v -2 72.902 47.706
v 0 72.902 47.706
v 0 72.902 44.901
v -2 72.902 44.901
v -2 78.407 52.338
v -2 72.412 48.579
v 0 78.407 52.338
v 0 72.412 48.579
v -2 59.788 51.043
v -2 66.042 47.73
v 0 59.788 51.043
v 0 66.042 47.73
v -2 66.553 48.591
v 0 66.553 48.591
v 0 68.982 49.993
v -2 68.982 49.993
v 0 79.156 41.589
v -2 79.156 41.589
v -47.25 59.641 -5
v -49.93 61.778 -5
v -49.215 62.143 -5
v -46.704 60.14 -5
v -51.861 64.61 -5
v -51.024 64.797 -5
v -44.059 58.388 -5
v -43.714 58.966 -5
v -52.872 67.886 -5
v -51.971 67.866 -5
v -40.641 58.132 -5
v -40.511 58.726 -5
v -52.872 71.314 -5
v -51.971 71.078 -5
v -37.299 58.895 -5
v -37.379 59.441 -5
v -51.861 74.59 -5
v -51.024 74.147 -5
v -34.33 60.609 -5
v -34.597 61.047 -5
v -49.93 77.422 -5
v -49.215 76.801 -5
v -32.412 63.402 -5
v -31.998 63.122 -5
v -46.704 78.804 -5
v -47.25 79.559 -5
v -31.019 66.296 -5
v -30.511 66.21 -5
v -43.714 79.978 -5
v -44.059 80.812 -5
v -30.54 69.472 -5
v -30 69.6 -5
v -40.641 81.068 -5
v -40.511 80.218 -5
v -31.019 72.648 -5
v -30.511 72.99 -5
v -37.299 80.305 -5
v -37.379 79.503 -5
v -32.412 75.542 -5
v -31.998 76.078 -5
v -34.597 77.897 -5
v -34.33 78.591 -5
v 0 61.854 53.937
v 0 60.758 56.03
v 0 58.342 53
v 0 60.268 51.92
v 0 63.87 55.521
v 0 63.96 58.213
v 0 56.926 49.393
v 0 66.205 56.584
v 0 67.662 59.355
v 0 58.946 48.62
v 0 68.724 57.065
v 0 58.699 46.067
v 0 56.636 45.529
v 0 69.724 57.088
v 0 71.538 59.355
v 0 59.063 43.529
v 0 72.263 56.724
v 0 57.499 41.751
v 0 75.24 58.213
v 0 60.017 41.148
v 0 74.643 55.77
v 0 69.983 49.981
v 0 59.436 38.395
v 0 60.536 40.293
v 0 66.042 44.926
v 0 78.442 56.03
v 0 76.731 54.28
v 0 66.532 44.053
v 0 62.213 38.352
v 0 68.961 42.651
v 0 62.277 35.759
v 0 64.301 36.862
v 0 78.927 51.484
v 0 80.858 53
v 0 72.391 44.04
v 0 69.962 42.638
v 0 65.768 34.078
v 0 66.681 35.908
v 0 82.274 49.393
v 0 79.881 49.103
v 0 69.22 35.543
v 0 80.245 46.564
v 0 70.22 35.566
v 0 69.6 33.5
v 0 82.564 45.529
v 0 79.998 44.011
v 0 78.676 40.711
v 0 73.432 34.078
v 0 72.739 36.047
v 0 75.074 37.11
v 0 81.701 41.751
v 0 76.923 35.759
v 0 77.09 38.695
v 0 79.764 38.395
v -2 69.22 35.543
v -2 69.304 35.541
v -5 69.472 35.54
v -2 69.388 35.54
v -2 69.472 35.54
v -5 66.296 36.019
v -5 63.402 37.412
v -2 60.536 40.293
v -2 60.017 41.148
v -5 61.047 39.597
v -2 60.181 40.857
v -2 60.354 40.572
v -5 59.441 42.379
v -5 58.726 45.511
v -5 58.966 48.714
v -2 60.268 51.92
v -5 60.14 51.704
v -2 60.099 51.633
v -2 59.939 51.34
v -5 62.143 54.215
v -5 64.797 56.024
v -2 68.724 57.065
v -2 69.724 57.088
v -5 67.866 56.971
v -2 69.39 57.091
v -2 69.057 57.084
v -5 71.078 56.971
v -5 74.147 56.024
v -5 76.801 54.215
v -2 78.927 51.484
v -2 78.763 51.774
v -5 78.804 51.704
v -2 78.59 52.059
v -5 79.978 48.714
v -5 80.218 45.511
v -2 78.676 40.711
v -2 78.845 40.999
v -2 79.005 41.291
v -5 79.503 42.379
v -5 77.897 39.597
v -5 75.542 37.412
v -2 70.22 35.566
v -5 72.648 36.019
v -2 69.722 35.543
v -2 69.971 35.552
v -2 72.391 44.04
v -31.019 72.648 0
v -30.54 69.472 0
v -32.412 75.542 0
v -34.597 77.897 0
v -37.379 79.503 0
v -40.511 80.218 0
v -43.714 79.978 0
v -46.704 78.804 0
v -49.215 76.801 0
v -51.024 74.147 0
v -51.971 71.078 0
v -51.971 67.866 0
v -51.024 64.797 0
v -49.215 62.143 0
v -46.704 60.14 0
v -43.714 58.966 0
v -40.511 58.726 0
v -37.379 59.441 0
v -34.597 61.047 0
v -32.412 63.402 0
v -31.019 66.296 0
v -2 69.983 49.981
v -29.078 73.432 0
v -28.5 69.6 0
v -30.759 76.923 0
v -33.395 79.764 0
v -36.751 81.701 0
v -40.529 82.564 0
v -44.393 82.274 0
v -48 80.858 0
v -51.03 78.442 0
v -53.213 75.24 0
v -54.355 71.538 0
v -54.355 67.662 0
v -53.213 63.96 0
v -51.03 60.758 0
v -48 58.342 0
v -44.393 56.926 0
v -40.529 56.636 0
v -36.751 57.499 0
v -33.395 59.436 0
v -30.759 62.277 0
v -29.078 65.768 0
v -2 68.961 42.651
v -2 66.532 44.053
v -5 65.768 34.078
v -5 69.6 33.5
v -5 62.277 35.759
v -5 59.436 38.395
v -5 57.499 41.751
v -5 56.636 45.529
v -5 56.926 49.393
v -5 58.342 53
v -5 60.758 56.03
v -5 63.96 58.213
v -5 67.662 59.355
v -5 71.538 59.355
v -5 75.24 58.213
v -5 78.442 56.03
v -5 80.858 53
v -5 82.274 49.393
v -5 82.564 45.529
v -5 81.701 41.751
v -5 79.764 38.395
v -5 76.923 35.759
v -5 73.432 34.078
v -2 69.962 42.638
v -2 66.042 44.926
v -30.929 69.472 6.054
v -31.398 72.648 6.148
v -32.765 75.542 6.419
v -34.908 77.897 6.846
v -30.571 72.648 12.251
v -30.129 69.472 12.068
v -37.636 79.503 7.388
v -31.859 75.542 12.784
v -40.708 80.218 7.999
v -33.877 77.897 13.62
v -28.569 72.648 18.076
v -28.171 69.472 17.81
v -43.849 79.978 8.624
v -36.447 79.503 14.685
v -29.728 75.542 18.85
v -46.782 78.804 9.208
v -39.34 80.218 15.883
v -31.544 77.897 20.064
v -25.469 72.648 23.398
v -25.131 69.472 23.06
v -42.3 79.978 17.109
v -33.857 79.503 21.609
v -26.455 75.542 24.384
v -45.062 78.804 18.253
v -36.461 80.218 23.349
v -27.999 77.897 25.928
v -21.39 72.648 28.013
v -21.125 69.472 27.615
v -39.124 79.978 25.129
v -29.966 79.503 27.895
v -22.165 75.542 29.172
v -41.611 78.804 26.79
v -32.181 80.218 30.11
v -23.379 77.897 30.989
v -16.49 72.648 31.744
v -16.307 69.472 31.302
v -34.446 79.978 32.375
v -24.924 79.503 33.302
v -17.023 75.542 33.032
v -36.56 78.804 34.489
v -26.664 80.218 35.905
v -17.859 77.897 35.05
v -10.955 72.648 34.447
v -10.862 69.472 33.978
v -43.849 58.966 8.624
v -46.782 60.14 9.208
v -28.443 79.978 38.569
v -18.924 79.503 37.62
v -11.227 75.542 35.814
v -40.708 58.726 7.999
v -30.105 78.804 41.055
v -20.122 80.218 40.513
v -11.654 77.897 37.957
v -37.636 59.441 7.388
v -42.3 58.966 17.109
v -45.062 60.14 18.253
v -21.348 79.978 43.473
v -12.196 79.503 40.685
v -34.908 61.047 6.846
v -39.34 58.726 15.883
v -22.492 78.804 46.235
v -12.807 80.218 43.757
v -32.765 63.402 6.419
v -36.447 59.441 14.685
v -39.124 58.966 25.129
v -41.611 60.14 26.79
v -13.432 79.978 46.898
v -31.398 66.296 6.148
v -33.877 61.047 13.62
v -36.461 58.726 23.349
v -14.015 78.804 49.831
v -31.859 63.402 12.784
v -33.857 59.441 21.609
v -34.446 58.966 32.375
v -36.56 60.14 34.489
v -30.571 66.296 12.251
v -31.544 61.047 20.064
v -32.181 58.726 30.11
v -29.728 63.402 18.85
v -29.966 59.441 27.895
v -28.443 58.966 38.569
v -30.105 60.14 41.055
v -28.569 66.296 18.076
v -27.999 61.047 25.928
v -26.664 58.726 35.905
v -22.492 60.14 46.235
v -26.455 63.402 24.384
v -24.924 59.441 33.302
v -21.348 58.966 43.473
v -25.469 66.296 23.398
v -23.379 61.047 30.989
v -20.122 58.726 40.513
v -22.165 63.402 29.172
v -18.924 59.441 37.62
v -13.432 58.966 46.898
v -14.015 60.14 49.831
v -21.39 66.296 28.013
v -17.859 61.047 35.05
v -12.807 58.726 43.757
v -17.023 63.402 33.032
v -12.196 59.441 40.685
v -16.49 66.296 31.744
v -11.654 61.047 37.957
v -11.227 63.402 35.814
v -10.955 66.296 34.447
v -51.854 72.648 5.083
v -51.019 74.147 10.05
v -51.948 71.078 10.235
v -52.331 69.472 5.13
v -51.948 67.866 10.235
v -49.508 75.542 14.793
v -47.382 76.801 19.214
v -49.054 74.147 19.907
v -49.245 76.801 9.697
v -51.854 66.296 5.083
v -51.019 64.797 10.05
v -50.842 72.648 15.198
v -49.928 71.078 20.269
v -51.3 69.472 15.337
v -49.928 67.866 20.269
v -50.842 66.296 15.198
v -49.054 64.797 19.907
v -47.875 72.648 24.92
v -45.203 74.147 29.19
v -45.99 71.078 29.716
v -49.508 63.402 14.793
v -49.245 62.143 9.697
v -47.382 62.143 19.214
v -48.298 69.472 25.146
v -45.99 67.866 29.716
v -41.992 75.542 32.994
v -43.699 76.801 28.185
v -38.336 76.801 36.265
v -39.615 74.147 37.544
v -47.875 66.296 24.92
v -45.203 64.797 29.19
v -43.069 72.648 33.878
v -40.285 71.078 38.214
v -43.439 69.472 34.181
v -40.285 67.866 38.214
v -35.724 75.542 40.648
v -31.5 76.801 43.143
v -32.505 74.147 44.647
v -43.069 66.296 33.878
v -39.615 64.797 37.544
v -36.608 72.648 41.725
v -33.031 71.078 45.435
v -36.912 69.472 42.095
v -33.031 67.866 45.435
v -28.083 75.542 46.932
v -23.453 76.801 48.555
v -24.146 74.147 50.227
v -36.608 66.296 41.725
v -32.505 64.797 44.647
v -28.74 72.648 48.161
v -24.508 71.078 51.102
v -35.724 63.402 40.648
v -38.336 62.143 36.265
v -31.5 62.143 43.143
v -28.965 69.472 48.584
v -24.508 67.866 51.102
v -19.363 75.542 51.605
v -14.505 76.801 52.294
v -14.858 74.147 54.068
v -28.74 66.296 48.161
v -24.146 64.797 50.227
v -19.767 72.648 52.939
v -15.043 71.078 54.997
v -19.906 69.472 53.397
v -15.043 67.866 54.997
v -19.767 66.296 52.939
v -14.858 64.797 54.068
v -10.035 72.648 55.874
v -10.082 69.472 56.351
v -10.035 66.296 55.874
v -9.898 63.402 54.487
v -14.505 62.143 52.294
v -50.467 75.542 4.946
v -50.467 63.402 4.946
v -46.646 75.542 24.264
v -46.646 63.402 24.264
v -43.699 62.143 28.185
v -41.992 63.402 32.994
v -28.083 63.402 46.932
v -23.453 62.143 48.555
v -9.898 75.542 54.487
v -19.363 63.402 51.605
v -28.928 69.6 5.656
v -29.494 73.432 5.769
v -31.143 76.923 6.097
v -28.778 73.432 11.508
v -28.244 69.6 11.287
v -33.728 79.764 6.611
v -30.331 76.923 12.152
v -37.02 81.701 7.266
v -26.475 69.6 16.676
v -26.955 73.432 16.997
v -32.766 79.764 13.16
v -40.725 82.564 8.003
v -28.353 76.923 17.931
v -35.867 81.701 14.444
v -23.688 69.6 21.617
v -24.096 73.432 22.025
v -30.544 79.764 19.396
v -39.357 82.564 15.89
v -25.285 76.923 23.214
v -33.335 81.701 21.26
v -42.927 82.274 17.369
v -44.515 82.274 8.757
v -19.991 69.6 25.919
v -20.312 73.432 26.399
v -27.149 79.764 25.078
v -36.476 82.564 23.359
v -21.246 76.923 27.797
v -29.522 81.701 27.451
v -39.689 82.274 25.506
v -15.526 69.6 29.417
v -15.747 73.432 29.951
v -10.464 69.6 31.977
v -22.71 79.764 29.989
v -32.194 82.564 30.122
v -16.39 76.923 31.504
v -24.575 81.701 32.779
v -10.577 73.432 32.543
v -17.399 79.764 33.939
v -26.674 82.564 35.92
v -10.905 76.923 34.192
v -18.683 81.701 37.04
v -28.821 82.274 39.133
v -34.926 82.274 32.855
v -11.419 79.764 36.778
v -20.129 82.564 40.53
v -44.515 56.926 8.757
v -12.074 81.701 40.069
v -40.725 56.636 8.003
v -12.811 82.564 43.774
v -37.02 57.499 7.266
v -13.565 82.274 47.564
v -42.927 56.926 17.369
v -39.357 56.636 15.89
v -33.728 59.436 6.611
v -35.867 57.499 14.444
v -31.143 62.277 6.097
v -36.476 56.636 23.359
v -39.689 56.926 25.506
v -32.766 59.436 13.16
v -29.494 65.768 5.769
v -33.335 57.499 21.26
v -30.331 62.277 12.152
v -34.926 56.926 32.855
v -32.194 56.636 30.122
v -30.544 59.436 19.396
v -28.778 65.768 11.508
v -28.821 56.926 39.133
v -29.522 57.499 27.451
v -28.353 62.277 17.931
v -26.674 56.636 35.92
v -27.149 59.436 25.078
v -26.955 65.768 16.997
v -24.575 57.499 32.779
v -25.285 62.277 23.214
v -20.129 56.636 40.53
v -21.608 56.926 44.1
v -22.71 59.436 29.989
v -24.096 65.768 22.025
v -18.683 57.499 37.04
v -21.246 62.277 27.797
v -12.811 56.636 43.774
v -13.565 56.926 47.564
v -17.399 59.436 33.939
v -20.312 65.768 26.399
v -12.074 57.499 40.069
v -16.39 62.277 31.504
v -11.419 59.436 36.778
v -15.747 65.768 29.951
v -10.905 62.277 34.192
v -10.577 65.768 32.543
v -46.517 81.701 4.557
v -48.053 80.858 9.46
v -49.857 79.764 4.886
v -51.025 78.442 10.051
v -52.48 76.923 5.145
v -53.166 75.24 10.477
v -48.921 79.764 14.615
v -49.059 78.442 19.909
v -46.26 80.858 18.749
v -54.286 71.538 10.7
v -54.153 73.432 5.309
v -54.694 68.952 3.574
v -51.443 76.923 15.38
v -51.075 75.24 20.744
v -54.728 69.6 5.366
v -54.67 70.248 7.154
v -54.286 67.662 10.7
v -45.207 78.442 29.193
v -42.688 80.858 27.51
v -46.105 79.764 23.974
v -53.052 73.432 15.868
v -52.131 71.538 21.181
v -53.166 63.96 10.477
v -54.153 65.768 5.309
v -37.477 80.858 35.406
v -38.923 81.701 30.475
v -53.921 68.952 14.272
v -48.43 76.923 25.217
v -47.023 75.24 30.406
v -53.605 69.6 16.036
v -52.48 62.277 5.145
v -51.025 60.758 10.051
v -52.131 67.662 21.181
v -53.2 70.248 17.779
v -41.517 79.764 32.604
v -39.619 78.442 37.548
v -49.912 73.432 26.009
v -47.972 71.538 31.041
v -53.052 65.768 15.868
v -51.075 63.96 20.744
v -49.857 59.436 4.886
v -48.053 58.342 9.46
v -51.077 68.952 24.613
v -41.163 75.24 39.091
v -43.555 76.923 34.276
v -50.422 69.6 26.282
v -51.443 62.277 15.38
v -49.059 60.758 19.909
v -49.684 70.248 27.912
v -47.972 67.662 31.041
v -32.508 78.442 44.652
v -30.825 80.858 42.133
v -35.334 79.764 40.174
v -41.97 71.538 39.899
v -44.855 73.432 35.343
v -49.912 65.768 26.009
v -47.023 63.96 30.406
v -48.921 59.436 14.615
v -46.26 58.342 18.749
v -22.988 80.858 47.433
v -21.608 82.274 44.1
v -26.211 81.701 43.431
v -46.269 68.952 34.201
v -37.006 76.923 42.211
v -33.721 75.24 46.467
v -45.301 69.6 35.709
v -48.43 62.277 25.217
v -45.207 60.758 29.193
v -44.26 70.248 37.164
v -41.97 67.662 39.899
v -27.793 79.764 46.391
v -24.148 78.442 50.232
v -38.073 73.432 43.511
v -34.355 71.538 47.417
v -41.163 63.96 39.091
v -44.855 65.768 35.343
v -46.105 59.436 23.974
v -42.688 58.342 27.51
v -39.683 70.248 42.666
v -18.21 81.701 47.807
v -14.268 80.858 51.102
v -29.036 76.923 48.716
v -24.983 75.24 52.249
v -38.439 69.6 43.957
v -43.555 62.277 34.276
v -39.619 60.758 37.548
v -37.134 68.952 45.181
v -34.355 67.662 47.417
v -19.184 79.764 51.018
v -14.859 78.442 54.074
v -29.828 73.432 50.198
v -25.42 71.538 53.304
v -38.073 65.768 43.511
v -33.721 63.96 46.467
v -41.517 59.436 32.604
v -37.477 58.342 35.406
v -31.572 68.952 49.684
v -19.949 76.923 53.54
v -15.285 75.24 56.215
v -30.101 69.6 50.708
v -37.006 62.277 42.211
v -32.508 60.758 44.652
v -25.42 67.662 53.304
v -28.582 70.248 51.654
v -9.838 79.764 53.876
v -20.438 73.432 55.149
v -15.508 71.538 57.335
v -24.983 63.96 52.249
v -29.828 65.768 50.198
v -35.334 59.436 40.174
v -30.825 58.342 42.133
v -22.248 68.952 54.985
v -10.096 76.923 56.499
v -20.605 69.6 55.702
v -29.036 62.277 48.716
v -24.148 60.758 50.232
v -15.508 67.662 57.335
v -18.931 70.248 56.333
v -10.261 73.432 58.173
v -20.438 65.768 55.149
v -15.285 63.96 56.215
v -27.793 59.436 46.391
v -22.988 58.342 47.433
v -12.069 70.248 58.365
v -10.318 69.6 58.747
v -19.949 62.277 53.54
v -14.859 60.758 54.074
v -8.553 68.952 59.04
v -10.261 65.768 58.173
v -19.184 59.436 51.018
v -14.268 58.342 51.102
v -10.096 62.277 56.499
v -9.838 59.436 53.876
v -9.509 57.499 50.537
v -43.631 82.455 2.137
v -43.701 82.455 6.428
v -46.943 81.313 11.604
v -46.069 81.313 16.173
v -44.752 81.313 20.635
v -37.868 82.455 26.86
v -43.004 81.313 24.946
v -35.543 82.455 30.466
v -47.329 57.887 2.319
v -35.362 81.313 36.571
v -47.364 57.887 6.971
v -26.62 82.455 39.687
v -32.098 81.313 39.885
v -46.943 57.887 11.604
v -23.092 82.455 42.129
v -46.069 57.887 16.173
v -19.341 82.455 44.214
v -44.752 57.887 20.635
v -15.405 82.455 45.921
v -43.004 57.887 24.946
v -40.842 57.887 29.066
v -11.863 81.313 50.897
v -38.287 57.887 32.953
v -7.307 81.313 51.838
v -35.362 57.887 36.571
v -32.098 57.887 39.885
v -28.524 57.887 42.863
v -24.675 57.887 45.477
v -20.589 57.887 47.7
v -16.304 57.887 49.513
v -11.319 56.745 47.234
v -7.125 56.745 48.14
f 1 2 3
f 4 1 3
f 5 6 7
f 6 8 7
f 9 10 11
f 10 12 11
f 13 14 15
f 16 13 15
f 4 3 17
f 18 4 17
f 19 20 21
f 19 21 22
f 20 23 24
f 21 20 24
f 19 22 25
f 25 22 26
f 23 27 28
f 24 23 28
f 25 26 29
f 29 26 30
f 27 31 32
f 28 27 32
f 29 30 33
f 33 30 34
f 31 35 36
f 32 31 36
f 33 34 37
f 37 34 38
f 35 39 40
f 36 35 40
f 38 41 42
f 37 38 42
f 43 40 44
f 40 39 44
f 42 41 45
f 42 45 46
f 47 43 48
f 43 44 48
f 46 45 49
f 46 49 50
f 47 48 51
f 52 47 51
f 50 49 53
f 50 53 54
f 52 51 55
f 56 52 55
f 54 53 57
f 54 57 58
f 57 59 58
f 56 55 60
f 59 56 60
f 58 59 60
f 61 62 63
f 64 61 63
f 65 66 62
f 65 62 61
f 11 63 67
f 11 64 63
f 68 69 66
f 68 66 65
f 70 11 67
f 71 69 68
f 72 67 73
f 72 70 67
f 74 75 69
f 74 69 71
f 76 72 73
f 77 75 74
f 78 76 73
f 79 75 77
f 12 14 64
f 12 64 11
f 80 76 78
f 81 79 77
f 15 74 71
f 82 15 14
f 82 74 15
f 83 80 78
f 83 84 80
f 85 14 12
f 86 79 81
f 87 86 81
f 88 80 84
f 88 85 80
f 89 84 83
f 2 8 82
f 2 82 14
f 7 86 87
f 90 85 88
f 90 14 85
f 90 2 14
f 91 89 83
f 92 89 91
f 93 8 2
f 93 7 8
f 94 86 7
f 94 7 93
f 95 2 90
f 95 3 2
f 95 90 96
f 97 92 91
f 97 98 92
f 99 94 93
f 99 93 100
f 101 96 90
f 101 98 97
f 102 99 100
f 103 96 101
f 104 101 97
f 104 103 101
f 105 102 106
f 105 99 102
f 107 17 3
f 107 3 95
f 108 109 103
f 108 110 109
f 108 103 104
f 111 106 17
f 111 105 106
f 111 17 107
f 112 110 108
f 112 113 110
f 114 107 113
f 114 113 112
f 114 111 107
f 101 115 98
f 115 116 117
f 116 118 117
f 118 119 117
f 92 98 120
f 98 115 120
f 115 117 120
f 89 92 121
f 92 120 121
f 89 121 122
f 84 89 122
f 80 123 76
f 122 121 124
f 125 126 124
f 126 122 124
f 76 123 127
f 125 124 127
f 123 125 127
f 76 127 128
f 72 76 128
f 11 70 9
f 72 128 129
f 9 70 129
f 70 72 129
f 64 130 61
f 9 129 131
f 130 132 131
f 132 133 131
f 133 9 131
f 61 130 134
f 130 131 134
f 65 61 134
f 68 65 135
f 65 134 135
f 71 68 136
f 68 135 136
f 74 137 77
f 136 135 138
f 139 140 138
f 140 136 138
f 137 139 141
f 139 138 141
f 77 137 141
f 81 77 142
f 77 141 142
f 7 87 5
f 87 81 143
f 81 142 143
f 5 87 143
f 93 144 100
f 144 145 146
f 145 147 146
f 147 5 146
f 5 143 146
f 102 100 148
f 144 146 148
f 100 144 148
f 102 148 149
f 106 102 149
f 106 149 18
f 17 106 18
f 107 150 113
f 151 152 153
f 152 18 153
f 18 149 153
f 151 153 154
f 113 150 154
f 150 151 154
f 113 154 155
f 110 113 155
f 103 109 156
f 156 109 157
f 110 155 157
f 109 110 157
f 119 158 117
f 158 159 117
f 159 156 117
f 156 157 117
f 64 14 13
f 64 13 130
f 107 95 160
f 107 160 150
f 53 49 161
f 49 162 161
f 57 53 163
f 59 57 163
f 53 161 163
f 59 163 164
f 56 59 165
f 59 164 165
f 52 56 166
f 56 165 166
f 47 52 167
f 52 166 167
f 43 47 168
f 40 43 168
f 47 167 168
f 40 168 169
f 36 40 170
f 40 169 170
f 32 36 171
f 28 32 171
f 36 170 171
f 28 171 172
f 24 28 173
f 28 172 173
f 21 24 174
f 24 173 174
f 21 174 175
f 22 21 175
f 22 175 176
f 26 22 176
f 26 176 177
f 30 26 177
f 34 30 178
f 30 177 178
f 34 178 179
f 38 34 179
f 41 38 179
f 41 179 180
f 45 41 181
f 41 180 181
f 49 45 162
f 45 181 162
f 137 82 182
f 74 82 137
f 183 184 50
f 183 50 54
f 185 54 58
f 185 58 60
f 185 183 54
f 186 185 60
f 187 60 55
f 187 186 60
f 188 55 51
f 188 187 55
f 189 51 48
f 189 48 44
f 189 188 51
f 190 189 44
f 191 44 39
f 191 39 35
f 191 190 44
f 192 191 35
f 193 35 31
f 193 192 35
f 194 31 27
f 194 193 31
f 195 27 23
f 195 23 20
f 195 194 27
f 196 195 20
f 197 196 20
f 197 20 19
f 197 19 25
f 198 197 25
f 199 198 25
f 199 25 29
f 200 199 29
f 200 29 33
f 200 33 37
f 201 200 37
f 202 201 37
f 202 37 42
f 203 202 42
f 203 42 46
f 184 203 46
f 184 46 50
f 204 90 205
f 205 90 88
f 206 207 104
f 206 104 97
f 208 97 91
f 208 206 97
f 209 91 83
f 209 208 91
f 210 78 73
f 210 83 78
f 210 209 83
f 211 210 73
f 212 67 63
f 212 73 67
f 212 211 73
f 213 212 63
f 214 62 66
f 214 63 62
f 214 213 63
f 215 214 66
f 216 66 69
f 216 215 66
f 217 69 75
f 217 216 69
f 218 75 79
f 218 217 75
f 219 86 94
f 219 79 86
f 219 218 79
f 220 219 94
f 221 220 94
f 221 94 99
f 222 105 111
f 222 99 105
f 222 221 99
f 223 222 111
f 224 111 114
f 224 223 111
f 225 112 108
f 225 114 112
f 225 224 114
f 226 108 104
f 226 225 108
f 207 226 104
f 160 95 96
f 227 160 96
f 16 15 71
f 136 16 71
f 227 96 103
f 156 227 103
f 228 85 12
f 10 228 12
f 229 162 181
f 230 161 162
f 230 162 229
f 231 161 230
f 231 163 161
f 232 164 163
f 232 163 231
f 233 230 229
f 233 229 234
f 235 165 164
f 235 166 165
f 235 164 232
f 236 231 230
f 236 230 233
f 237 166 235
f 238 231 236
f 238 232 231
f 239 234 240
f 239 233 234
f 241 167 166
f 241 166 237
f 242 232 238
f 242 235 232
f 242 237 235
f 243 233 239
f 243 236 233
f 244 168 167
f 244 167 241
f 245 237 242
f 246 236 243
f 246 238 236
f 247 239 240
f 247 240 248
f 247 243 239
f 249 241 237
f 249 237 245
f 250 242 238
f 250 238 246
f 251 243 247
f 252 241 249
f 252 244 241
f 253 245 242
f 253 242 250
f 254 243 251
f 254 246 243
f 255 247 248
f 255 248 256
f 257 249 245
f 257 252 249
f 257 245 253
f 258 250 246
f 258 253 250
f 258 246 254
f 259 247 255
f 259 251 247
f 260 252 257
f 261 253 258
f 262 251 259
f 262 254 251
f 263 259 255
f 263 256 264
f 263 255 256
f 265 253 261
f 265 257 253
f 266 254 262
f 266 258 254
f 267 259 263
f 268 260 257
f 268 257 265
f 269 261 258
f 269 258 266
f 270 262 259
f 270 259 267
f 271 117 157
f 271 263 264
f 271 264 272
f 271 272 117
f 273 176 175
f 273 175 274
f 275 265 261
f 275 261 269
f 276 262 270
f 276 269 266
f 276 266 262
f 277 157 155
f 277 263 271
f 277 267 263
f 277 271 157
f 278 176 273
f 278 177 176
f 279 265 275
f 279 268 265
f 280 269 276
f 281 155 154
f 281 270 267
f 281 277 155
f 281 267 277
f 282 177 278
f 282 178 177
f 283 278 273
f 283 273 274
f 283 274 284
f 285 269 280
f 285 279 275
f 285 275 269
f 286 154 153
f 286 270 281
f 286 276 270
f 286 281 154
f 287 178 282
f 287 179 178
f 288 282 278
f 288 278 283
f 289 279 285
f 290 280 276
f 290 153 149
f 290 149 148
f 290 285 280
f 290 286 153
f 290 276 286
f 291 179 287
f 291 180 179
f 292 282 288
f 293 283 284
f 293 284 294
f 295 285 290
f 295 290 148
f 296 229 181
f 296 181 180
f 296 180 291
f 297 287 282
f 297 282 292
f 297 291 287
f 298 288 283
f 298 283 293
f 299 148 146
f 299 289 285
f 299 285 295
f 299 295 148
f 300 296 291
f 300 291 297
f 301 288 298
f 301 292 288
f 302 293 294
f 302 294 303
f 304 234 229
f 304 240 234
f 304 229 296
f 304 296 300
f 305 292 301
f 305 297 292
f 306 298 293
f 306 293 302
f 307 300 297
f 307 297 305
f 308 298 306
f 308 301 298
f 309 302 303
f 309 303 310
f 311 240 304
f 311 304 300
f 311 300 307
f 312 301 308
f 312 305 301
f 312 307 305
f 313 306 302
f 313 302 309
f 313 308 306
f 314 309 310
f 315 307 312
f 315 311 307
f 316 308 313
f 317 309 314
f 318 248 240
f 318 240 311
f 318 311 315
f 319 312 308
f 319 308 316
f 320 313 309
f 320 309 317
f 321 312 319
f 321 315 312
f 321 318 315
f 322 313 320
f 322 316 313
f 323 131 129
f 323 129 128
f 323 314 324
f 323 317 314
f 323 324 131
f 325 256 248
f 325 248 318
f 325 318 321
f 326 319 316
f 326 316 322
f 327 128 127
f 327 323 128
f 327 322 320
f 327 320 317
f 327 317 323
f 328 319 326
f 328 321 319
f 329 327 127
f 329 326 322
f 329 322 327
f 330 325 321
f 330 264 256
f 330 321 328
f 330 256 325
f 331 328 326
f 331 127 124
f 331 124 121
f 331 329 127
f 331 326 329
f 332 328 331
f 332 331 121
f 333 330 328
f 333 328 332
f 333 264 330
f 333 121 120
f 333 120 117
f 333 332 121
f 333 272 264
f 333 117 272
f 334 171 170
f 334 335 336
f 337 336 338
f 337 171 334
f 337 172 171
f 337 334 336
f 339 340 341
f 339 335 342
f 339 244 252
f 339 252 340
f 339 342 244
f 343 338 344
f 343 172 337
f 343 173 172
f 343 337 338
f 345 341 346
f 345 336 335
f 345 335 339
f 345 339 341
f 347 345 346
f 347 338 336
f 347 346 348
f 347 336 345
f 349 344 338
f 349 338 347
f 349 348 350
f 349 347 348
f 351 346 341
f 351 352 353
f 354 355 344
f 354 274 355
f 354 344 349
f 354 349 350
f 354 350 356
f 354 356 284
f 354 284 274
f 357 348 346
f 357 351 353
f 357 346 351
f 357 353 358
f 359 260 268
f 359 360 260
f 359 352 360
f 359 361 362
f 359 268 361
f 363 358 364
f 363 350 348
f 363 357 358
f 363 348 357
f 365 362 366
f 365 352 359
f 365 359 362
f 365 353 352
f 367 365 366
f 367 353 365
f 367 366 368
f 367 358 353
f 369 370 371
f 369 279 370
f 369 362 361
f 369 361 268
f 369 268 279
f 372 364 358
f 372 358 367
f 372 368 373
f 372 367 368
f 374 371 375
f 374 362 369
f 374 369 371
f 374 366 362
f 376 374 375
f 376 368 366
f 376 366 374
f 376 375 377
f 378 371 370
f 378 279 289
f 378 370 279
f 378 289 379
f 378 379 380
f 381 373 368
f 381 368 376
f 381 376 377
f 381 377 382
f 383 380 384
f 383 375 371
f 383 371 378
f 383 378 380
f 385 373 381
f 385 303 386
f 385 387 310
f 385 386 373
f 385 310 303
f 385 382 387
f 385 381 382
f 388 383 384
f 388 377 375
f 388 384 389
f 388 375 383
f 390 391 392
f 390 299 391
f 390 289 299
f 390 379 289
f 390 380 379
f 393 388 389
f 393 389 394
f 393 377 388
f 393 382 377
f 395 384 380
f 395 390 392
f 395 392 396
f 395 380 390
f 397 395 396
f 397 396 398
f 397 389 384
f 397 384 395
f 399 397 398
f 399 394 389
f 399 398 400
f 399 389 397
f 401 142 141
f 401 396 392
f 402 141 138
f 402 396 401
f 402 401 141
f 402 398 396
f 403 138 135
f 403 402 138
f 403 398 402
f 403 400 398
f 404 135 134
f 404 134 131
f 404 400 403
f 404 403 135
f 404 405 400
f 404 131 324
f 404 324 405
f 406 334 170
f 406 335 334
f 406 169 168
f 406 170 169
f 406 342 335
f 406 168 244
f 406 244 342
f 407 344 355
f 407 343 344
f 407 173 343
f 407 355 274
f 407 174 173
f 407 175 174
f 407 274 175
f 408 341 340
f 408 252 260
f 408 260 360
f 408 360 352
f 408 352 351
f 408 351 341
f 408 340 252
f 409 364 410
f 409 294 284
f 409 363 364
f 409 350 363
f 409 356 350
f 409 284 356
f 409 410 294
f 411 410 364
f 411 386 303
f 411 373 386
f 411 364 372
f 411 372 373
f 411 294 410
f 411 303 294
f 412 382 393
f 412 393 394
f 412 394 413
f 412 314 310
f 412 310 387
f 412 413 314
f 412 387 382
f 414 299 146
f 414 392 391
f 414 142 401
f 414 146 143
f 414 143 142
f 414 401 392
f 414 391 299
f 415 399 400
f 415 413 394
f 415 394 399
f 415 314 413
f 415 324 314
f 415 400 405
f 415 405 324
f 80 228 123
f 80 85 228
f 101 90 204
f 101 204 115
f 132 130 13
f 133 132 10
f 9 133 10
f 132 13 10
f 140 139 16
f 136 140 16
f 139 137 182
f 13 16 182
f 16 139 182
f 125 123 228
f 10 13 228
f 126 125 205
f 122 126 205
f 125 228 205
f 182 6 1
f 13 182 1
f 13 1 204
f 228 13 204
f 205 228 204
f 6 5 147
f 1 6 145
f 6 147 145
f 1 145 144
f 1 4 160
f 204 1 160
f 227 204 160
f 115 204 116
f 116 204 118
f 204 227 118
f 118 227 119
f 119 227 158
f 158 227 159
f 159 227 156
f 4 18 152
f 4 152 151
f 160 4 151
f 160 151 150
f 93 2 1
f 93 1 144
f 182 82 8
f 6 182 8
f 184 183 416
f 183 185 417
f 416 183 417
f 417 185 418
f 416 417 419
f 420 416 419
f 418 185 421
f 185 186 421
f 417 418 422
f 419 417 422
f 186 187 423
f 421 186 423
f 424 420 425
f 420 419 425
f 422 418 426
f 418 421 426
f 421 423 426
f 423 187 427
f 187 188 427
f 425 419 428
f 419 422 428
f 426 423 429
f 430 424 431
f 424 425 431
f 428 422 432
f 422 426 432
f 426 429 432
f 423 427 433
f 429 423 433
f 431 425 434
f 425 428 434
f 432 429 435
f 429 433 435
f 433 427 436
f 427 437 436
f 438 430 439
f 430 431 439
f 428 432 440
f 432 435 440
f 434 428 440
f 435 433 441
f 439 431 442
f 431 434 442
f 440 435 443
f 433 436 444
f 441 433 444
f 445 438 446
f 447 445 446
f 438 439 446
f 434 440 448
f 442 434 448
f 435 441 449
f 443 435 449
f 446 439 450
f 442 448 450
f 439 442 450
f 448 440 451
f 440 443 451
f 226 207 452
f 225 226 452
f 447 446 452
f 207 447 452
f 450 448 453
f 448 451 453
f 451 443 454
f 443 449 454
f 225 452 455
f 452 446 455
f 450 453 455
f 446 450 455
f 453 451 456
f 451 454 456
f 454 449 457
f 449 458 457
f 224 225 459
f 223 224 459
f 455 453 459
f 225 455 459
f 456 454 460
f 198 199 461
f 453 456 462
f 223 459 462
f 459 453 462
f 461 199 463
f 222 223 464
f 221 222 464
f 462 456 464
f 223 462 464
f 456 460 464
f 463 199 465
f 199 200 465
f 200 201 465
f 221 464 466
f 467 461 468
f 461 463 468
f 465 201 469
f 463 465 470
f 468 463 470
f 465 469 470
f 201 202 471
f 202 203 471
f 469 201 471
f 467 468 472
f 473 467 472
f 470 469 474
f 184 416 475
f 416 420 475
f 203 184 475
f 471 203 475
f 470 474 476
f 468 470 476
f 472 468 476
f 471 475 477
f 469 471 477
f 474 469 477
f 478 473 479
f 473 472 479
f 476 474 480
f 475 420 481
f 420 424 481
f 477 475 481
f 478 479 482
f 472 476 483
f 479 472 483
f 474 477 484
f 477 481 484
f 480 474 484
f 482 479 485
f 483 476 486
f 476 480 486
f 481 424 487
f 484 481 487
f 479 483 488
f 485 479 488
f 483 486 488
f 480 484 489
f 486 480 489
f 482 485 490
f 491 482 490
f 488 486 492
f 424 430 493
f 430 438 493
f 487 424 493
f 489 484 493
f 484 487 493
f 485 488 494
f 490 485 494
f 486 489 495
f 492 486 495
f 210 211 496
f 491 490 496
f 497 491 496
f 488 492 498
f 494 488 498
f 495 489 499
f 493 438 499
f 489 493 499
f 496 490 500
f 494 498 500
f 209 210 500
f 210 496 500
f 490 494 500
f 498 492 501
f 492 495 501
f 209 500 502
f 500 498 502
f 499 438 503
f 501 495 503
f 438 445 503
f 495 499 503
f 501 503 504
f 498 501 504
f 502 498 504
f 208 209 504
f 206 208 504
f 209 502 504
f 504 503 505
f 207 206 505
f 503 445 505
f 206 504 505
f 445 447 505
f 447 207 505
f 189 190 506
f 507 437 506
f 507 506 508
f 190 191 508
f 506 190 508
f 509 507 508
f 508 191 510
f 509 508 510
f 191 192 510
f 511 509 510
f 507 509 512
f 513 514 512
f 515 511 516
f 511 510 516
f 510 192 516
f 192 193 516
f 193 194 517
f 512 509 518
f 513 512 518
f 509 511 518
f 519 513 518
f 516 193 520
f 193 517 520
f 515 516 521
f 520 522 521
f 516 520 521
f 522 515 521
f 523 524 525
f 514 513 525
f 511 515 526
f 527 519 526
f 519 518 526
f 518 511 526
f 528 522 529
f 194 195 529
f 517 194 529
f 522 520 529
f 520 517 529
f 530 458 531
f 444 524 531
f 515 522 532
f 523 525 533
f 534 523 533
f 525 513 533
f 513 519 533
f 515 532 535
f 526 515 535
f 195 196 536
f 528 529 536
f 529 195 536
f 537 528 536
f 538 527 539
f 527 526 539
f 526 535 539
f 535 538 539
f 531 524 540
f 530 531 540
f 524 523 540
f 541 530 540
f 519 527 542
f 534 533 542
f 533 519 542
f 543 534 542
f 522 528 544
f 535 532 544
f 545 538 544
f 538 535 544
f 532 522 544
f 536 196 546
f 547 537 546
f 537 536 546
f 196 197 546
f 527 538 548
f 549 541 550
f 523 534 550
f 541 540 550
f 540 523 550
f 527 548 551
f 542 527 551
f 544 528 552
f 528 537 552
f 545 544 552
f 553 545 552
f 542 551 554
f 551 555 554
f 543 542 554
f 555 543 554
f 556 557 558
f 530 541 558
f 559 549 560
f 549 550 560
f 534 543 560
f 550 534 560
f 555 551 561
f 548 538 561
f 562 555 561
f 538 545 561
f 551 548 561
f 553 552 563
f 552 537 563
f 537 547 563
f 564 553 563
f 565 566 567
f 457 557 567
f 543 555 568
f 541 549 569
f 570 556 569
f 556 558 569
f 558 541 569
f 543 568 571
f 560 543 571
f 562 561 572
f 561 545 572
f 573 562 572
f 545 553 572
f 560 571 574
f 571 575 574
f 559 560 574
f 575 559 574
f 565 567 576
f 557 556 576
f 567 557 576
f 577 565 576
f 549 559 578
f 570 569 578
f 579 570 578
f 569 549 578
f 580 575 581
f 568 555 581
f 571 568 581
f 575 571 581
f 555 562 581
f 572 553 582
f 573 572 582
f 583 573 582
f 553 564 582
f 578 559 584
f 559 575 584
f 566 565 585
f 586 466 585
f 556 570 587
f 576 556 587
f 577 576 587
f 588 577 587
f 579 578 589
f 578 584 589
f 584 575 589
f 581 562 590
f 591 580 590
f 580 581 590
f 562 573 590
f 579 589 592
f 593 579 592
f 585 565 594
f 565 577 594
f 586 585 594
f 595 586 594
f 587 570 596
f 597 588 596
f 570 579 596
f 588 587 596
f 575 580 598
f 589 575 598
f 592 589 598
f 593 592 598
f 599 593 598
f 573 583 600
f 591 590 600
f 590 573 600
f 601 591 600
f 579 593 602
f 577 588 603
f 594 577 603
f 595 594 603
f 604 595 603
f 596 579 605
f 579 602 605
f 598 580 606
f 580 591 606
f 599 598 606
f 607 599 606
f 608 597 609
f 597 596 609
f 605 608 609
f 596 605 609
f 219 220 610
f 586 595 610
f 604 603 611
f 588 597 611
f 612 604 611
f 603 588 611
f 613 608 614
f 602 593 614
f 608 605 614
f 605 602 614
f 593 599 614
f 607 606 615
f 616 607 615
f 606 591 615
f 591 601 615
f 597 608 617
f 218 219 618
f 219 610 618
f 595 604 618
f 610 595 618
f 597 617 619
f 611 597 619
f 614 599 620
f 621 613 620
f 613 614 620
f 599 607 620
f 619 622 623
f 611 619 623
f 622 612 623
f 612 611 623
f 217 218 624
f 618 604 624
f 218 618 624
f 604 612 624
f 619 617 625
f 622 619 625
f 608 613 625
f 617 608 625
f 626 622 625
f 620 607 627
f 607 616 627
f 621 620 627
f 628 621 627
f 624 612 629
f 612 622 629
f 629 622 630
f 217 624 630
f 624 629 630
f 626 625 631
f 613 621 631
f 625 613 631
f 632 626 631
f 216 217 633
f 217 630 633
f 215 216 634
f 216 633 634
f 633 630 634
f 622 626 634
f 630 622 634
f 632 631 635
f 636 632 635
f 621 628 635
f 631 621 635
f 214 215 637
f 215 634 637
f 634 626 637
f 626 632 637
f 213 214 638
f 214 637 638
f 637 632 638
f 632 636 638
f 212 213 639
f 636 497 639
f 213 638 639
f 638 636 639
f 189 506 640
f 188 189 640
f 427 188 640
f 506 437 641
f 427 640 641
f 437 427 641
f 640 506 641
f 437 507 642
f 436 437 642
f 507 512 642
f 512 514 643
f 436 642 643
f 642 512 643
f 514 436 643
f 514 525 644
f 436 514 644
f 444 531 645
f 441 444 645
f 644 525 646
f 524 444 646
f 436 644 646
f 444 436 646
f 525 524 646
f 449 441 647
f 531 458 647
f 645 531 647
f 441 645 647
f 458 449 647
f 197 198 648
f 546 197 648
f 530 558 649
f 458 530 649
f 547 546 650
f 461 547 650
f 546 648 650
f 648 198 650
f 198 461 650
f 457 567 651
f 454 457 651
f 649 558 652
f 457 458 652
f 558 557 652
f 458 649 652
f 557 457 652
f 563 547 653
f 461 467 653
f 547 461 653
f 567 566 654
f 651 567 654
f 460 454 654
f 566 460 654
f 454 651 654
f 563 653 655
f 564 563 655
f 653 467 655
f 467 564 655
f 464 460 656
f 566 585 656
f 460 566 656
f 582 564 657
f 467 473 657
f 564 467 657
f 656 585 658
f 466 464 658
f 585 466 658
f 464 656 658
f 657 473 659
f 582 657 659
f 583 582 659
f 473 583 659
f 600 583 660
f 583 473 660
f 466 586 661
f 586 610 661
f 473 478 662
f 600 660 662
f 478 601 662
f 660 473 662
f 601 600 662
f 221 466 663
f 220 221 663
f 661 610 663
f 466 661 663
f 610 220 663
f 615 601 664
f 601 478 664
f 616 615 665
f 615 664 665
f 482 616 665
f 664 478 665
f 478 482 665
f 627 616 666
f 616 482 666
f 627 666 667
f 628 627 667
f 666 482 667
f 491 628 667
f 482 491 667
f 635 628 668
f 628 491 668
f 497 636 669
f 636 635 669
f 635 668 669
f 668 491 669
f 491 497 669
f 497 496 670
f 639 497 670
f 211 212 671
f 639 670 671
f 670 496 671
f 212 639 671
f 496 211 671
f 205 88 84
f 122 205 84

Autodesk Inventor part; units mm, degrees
ref_plane "YZ Plane" through (0, 0, 0) normal (1, 0, 0) x (0, 1, 0)
ref_plane "XZ Plane" through (0, 0, 0) normal (0, 1, 0) x (-1, 0, 0)
ref_plane "XY Plane" through (0, 0, 0) normal (0, 0, 1) x (1, 0, 0)
sketch "Esquisse1" plane through (0, 0, 0) normal (0, 0, 1) x (1, 0, 0)
  circle A0 centre (-41.5, 69.6) radius 12.5 projected
  circle A1 centre (-41.5, 69.6) radius 11
  circle A2 centre (-41.5, 69.6) radius 13
  point P0 (0, 0)
  dimension "d11" = 0.5
  dimension "d15" = 2
ref_plane "Plan de construction2" through (-41.5, 69.6, 0) normal (0, -1, 0) x (0, 0, 1)
ref_plane "Plan de construction1" through (0, 0, -152.2) normal (0, -1, 0) x (0, 0, 1)
sketch "Esquisse2" plane through (-41.5, 69.6, 0) normal (0, -1, 0) x (0, 0, 1)
  point P0 (0, -41.5)
  point P1 (0, 0)
  point P2 (-5, 0)
  dimension "d1" = 5
ref_plane "Plan de construction4" through (-41.5, 69.6, -5) normal (0, 0, 1) x (1, 0, 0)
ref_plane "Plan de construction3" through (0, 0, 0) normal (0, 0, 1) x (1, 0, 0)
sketch "Esquisse3" plane through (-41.5, 69.6, -5) normal (0, 0, 1) x (1, 0, 0)
  circle A0 centre (0, 0) radius 12.5 projected
  circle A1 centre (0, 0) radius 9.5
  circle A2 centre (0, 0) radius 11.5
  point P0 (41.5, -69.6)
  dimension "d13" = 2
  dimension "d14" = 1
ref_plane "Plan de construction5" through (-41.5, 69.6, 0) normal (0, 0, 1) x (1, 0, 0)
loft "Lissage2" add profiles "Esquisse3", "Esquisse1" contours A1 | A2 / A0 | A1 | A2
sketch "Esquisse5" plane through (-41.5, 69.6, 0) normal (0, 0, 1) x (1, 0, 0)
  circle A0 centre (0.1842, -0.128) radius 10.7757
  circle A1 centre (0, 0) radius 13 projected
  point P0 (41.5, -69.6)
  dimension "d20" = 2
extrude "Extrusion2" cut sketch "Esquisse5" against normal blind 10 contours A0
ref_plane "Plan de construction6" through (0, 0, 0) normal (-1, 0, 0) x (0, -1, 0)
sketch "Esquisse6" plane through (0, 0, 0) normal (-1, 0, 0) x (0, -1, 0)
  point P0 (0, 0)
sketch "Esquisse7" plane through (-41.5, 69.6, 0) normal (0, 0, 1) x (1, 0, 0)
  circle A0 centre (0.1842, -0.128) radius 10.7757 projected
  circle A1 centre (0, 0) radius 13 projected
  point P0 (41.5, -69.6)
sketch "Esquisse8" plane through (0, 0, 0) normal (-1, 0, 0) x (0, -1, 0)
  line L0 (0, 5) -> (-101.6415, 5)
  point P0 (0, 0)
  dimension "d23" = 5
revolve "Révolution1" add sketch "Esquisse7" angle 90 about axis through (0, 0, 5) along (0, 1, 0)
sketch "Esquisse9" plane through (-5, 69.6, 46.5) normal (1, 0, 0) x (0, 0, -1)
  circle A0 centre (0, 0) radius 13 projected
  circle A1 centre (0.1842, -0.128) radius 10.7757 projected
  point P0 (46.5, -69.6)
  point P1 (13, 0)
  point P2 (10.9599, -0.128)
extrude "Extrusion3" add sketch "Esquisse9" along normal up to surface (5 mm away)
sketch "Esquisse10" plane through (0, 69.6, 46.5) normal (1, 0, 0) x (0, 0, -1)
  circle A0 centre (0.1842, -0.128) radius 10.7757 projected
  line L0 (2.1644, -3.5577) -> (-1.7959, -3.5577)
  line L1 (-1.7959, -3.5577) -> (-3.7761, -0.128)
  line L2 (-3.7761, -0.128) -> (-1.7959, 3.3017)
  line L3 (-1.7959, 3.3017) -> (2.1644, 3.3017)
  line L4 (2.1644, 3.3017) -> (4.1445, -0.128)
  line L5 (4.1445, -0.128) -> (2.1644, -3.5577)
  line L6 (2.4473, -3.0677) -> (6.2069, -9.0635)
  line L7 (1.5742, -3.5577) -> (5.3525, -9.5834)
  line L8 (3.8616, 0.362) -> (10.9339, 0.62)
  line L9 (3.8494, -0.6391) -> (10.9569, -0.3798)
  line L10 (1.5986, 3.3017) -> (4.9112, 9.5555)
  line L11 (2.4595, 2.7906) -> (5.7886, 9.0755)
  line L12 (-2.0788, 2.8117) -> (-5.8384, 8.8074)
  line L13 (-1.2058, 3.3017) -> (-4.9841, 9.3273)
  line L14 (-3.4932, -0.618) -> (-10.5654, -0.8761)
  line L15 (-3.481, 0.3831) -> (-10.5885, 0.1237)
  line L16 (-1.2301, -3.5577) -> (-4.5428, -9.8115)
  line L17 (-2.091, -3.0466) -> (-5.4202, -9.3316)
  point P0 (46.5, -69.6)
  point P1 (3.8494, -0.6391)
  point P2 (10.9569, -0.3798)
  point P3 (10.9339, 0.62)
  point P4 (3.8616, 0.362)
  point P5 (2.4595, 2.7906)
  point P6 (5.7886, 9.0755)
  point P7 (4.9112, 9.5555)
  point P8 (1.5986, 3.3017)
  point P9 (-1.2058, 3.3017)
  point P10 (-4.9841, 9.3273)
  point P11 (-5.8384, 8.8074)
  point P12 (-2.0788, 2.8117)
  point P13 (-3.481, 0.3831)
  point P14 (-10.5885, 0.1237)
  point P15 (-10.5654, -0.8761)
  point P16 (-3.4932, -0.618)
  point P17 (-2.091, -3.0466)
  point P18 (-5.4202, -9.3316)
  point P19 (-4.5428, -9.8115)
  point P20 (-1.2301, -3.5577)
  dimension "d28" = 0.5
  dimension "d29" = 0.5
  dimension "d32" = 360
extrude "Extrusion4" add sketch "Esquisse10" against normal blind 2 contours A0 L9 L5 L4 L8 | L11 L4 L3 L10 A0 | L4 L5 L0 L1 L2 L3 | A0 L7 L0 L5 L6 | L13 L3 L2 L12 A0 | A0 L17 L1 L0 L16 | L15 L2 L1 L14 A0
properties part number "Aeration"
